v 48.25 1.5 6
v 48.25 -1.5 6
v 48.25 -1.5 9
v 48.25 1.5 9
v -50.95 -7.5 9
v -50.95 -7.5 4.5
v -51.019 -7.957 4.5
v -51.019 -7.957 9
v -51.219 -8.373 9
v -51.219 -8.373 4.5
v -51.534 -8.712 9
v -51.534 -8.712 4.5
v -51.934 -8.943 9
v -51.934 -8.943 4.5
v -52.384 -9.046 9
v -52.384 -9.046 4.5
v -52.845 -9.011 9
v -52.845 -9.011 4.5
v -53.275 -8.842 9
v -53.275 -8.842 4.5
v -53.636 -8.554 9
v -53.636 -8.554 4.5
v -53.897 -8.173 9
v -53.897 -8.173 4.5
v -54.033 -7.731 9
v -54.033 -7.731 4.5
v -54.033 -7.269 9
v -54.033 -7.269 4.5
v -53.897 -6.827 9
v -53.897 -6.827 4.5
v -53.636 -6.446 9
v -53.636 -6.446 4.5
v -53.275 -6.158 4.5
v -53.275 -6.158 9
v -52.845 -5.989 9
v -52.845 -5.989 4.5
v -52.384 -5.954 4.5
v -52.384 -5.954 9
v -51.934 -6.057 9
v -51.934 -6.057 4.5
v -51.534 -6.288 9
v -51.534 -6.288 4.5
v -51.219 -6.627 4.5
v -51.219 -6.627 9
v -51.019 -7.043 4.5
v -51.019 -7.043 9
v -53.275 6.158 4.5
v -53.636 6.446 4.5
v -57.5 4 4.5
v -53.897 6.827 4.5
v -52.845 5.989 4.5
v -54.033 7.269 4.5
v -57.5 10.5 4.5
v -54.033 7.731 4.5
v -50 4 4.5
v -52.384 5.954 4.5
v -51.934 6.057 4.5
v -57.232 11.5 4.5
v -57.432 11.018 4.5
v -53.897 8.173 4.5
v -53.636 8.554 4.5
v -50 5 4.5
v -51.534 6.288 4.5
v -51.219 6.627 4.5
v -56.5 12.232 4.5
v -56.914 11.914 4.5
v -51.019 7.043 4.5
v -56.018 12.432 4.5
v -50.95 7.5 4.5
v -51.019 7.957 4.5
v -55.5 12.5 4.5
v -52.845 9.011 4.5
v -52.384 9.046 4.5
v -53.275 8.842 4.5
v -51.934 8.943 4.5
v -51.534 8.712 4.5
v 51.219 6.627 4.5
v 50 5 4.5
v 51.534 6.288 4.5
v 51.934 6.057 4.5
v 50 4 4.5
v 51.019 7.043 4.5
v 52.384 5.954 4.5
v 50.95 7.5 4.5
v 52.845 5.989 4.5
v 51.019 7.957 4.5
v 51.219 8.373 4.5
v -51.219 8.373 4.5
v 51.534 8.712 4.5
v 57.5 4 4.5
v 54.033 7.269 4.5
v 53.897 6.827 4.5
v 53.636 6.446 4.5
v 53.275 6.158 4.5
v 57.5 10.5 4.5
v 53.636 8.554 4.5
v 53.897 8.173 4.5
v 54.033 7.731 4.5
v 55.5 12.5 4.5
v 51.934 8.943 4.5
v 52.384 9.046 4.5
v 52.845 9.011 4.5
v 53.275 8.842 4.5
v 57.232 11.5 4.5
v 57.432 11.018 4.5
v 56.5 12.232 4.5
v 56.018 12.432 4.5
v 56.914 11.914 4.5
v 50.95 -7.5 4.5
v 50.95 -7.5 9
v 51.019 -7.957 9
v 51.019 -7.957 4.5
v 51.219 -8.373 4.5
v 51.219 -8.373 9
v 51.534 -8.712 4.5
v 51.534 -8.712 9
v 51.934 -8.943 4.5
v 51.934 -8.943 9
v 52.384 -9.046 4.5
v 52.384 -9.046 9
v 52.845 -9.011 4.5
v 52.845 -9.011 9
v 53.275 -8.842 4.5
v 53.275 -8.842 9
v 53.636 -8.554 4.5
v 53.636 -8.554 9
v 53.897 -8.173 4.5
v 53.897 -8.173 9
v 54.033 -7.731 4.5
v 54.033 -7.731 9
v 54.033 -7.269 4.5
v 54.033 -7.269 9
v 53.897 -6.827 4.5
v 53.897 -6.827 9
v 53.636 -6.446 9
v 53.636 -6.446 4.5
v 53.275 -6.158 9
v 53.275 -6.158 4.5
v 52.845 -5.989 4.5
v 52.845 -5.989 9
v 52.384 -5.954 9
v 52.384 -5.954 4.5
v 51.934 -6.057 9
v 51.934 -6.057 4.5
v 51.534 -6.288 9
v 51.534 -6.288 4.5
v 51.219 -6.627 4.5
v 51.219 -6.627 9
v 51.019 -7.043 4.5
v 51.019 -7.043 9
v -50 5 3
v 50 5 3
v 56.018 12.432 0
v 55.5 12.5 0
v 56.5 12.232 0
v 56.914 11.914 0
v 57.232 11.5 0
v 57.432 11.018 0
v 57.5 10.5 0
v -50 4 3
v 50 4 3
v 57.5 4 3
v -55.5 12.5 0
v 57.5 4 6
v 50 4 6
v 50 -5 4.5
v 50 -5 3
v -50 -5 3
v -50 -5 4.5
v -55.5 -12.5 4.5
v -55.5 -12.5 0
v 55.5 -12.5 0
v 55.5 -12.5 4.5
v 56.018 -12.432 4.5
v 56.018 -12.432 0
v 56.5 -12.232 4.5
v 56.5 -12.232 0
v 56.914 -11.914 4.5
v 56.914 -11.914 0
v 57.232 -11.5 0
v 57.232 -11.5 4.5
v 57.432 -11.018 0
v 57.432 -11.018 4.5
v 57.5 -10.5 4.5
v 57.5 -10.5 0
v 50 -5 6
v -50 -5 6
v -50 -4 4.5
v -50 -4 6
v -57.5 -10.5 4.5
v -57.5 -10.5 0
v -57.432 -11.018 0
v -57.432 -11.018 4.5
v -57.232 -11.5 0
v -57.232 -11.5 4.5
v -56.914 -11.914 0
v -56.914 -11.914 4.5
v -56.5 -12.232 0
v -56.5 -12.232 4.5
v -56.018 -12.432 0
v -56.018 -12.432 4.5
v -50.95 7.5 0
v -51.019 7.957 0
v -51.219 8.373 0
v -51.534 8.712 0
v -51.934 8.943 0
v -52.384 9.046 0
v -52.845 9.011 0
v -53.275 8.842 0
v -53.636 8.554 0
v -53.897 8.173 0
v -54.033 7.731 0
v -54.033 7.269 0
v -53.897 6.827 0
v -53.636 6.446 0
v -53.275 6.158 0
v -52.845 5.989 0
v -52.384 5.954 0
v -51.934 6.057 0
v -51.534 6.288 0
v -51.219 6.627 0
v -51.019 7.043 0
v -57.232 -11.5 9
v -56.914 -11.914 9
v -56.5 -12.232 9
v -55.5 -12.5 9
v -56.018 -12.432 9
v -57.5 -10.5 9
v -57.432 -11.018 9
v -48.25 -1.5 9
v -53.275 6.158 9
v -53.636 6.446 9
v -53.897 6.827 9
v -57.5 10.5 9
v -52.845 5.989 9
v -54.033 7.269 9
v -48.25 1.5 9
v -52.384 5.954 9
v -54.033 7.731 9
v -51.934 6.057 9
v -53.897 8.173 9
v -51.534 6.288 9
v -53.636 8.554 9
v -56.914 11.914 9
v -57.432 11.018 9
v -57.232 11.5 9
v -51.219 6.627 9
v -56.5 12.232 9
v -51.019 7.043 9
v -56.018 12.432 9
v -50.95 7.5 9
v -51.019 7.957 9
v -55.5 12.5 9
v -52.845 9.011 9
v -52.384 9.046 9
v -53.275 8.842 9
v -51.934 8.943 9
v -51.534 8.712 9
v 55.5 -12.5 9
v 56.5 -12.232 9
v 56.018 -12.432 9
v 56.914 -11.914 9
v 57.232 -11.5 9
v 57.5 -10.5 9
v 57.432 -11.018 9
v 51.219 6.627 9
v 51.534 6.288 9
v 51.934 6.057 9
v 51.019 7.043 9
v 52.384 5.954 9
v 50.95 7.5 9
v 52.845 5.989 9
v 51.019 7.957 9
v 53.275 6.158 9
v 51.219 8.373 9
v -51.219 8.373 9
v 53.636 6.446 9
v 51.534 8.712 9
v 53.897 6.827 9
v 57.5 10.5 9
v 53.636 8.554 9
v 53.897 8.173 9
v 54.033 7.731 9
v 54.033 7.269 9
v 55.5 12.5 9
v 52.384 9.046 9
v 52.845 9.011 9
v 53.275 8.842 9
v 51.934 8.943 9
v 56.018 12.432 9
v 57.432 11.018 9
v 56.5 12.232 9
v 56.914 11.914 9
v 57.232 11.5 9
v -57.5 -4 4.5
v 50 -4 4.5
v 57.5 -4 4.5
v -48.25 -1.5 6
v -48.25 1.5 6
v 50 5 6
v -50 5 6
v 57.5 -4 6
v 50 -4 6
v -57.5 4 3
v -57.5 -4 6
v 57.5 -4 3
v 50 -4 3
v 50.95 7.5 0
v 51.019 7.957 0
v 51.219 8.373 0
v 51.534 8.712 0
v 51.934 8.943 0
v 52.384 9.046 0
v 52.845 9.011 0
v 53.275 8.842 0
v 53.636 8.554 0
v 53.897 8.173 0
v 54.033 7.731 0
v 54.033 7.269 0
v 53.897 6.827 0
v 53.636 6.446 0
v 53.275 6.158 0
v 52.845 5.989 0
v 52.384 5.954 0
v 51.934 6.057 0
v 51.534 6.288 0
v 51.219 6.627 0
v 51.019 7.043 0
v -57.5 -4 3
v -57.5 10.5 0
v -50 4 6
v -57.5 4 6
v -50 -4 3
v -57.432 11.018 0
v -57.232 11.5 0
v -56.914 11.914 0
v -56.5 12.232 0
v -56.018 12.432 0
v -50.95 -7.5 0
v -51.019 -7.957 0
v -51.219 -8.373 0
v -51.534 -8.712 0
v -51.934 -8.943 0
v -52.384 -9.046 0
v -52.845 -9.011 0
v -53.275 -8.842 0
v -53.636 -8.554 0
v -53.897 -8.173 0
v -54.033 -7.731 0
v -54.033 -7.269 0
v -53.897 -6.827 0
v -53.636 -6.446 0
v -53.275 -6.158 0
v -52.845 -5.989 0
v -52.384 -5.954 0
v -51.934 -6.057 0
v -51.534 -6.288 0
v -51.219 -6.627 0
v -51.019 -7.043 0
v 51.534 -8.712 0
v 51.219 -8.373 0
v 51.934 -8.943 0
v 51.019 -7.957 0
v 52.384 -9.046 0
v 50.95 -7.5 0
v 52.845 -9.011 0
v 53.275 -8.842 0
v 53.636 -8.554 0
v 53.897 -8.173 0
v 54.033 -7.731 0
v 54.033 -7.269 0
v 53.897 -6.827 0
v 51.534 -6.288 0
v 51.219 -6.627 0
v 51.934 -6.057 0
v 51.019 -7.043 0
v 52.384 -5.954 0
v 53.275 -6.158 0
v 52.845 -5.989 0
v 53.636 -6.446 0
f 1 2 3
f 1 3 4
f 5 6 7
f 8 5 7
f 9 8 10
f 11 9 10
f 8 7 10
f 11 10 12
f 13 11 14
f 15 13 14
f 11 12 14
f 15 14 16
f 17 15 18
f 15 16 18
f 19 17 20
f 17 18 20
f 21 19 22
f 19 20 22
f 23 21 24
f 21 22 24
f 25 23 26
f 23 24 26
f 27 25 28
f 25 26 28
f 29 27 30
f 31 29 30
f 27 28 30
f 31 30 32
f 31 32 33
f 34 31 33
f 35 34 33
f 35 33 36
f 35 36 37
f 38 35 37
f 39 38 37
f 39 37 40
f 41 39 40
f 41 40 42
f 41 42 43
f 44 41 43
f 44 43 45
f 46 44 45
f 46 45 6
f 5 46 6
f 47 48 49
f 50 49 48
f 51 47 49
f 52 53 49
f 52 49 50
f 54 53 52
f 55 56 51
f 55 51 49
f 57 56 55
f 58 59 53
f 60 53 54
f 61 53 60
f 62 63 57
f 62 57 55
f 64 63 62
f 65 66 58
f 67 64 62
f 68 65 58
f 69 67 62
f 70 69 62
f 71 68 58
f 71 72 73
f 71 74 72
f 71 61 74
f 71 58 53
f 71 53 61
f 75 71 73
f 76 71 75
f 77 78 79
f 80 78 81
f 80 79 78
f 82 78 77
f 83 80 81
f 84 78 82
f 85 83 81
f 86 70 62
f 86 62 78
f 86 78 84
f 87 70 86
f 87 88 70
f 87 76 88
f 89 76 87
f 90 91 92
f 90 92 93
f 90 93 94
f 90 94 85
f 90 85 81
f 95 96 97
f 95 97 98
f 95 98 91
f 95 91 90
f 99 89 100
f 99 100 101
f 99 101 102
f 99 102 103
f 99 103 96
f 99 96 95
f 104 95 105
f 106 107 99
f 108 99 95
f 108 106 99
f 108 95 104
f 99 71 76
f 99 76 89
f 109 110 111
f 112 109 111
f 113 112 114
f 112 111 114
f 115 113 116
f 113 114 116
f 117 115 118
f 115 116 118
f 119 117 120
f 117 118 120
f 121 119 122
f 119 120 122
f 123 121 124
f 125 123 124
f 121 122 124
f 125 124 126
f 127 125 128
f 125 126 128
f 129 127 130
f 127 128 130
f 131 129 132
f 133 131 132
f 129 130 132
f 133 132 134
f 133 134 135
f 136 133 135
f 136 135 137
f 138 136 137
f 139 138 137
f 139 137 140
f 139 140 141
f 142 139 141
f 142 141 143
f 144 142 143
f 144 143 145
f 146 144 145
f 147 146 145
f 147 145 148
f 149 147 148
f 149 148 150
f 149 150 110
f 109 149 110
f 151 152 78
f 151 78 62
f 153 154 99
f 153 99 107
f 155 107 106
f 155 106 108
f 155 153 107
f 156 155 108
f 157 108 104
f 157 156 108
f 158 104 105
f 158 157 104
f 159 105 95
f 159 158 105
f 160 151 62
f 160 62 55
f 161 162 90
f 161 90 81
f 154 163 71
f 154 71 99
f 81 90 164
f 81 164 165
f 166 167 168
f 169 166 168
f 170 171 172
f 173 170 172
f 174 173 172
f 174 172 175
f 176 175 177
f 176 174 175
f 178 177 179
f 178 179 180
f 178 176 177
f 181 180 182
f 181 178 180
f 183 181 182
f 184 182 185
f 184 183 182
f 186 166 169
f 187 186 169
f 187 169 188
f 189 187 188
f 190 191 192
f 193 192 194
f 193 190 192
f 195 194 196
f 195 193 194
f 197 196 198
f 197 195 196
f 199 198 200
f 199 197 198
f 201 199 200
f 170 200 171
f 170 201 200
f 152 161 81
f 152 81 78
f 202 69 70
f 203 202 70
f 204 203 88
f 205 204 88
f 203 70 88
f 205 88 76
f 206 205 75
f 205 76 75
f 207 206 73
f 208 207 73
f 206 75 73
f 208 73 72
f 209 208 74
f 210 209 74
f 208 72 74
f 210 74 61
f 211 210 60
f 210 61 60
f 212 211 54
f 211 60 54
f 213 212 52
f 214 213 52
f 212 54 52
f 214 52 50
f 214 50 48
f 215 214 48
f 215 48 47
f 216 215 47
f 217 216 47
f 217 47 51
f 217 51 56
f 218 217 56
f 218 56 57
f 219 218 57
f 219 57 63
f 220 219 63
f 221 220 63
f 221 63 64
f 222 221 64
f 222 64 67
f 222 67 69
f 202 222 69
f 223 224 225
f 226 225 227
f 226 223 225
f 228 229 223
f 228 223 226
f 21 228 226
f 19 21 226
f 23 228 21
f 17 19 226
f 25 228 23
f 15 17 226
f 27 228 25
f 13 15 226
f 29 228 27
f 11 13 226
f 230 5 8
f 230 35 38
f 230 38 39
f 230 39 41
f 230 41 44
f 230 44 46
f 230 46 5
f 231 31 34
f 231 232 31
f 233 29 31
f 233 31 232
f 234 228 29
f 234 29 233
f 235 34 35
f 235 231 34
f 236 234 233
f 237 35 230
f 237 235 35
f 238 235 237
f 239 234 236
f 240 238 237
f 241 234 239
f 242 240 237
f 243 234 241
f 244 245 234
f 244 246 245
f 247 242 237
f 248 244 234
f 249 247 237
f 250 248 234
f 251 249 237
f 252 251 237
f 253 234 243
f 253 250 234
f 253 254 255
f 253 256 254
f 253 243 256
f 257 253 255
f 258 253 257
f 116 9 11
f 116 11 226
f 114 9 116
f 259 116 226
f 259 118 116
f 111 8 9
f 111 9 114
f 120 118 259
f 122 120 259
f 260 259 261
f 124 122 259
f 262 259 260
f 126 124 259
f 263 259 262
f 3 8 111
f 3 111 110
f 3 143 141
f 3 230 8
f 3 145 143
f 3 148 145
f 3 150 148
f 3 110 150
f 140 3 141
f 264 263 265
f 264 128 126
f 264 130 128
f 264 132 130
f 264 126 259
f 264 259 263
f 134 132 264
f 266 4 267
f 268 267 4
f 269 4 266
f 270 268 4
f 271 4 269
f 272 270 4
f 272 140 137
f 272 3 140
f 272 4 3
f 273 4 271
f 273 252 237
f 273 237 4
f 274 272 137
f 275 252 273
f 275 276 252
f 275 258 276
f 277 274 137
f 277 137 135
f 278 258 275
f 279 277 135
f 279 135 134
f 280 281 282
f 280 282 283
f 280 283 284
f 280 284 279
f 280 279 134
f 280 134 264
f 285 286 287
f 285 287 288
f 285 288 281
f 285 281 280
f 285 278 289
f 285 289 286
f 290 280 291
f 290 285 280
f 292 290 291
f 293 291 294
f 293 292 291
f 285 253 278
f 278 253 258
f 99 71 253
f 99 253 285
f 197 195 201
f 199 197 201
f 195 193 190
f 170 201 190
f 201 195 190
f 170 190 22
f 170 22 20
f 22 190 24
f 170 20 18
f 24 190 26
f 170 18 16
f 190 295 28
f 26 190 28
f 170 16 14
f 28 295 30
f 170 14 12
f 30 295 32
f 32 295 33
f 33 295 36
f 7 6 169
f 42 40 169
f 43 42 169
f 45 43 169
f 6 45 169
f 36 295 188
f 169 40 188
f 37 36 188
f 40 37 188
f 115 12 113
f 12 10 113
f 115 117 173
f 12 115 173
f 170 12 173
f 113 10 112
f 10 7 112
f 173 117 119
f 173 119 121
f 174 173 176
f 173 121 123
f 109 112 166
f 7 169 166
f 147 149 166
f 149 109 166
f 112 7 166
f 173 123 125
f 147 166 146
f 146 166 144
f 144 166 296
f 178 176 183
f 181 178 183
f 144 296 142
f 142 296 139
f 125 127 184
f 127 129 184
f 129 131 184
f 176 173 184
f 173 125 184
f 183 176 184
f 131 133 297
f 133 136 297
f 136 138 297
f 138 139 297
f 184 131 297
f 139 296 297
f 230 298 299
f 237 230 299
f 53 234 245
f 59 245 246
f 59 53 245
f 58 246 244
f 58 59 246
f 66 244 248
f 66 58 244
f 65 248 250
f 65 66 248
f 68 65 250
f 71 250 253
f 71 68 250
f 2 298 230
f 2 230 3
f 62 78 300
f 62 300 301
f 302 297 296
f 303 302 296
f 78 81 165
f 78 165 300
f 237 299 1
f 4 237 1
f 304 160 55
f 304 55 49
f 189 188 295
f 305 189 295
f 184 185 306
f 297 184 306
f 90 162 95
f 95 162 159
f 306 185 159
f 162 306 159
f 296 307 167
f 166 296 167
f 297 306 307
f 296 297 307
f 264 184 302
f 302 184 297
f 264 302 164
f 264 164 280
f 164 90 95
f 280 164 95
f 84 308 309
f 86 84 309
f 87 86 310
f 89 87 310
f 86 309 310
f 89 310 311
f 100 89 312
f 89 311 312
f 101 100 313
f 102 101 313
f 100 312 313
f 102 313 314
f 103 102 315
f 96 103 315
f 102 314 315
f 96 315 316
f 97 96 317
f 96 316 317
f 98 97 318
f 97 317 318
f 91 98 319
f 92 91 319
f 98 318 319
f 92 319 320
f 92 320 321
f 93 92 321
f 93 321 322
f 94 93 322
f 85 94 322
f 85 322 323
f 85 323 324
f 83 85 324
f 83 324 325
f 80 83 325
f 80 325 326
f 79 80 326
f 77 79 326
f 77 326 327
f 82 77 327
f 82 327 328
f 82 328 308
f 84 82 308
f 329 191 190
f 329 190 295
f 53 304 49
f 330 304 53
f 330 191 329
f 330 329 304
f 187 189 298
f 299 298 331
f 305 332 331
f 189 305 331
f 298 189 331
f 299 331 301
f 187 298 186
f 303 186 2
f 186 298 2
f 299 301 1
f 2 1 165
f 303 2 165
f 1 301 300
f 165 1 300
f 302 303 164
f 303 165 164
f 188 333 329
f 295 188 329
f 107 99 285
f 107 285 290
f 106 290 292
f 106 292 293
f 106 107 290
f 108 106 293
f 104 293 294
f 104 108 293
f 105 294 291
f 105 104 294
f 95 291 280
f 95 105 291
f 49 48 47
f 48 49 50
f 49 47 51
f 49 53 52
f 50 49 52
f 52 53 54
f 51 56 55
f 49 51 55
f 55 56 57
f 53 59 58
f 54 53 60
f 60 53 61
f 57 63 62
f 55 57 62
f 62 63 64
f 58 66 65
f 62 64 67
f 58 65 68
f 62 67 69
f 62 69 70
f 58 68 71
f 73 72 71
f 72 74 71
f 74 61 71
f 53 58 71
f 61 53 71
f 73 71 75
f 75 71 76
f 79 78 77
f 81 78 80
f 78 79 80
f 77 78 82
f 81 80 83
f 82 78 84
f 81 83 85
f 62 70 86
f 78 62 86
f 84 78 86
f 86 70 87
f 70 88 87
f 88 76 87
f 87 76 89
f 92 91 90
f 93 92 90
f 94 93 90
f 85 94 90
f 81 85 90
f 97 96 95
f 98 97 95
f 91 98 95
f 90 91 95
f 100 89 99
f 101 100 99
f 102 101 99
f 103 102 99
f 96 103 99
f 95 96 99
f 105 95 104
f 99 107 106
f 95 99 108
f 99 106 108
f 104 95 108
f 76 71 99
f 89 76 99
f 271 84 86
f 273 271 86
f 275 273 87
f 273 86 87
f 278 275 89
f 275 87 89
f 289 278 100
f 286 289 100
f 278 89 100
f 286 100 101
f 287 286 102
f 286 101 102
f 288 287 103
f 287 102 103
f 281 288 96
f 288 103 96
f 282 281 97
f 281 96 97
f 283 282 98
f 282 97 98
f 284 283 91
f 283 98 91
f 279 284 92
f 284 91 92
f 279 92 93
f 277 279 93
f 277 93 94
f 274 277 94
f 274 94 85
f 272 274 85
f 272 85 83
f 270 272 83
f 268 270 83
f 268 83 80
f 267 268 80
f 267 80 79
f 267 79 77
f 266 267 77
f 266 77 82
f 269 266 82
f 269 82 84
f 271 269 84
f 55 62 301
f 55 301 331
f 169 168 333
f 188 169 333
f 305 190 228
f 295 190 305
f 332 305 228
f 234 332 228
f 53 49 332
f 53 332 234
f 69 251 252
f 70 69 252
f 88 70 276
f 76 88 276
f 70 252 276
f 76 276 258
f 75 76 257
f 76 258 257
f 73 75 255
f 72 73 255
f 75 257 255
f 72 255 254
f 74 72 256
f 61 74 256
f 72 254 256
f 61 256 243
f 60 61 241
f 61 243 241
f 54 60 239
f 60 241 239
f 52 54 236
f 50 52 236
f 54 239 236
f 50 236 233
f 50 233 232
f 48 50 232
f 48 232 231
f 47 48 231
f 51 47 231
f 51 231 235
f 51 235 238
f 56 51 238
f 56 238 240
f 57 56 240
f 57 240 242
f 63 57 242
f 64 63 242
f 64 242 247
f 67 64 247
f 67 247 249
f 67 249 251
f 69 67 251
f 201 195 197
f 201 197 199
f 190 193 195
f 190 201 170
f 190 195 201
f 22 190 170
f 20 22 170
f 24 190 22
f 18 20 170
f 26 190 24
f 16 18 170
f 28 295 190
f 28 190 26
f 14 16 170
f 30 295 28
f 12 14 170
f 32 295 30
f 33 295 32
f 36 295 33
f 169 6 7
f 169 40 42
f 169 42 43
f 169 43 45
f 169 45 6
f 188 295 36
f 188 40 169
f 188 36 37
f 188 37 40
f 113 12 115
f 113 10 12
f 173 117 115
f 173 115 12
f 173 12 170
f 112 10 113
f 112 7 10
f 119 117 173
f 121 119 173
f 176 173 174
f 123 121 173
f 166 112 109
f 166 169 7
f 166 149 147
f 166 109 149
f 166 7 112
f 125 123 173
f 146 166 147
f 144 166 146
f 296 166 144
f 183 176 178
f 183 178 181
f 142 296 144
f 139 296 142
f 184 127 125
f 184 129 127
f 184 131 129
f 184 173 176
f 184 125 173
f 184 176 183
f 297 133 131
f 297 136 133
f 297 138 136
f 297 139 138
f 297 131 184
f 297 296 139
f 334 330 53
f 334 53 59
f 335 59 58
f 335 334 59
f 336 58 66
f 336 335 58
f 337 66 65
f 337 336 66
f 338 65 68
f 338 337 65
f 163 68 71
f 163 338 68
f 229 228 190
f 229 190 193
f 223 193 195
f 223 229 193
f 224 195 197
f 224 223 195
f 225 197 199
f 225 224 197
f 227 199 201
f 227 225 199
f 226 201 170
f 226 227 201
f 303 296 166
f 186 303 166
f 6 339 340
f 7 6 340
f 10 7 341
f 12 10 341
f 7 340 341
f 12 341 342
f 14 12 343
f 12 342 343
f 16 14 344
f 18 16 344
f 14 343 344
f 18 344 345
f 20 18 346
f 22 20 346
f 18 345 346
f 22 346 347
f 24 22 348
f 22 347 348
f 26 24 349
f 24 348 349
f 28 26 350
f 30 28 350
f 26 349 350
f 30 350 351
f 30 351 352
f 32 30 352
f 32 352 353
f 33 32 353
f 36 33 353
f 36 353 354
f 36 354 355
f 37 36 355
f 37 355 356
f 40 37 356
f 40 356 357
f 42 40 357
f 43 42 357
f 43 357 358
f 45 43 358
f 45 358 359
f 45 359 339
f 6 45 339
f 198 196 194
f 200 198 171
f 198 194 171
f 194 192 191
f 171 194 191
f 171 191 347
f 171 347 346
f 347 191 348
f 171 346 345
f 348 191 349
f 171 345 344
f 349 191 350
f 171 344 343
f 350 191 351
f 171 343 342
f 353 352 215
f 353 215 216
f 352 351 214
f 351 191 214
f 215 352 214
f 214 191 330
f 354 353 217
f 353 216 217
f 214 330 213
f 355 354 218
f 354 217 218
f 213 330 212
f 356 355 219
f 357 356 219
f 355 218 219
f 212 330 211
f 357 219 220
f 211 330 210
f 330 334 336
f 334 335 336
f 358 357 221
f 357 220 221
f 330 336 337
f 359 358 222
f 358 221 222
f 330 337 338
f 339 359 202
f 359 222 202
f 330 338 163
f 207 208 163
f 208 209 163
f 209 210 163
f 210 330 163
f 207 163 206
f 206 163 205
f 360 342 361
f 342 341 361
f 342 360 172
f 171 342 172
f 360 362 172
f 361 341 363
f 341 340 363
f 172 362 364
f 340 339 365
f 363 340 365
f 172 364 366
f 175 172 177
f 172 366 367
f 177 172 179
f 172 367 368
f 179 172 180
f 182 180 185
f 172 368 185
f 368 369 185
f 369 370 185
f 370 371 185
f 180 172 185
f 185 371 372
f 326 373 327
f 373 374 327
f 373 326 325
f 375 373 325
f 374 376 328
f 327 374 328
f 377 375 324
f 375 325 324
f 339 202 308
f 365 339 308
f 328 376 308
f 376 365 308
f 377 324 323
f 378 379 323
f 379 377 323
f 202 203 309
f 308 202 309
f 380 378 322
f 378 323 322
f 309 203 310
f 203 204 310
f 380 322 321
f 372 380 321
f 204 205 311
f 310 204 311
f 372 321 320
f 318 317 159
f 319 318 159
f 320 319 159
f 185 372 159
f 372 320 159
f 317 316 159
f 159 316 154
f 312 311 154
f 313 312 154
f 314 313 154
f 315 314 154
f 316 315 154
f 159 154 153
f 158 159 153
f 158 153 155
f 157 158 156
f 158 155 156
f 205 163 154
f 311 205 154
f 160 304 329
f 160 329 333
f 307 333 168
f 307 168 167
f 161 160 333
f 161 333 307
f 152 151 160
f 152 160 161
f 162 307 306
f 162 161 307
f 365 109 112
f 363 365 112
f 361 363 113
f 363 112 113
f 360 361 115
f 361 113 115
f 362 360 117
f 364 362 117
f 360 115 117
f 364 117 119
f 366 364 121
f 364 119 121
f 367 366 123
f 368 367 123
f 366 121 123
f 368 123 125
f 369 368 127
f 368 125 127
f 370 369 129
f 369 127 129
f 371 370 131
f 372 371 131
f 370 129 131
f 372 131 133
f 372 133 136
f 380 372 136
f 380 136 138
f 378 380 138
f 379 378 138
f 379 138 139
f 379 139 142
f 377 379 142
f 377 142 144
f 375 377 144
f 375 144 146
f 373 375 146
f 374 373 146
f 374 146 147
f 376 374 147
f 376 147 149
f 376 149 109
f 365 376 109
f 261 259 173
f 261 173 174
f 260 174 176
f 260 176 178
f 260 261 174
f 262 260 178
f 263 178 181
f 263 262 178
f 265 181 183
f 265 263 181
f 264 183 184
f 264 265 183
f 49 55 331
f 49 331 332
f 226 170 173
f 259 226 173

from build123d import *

# Parameters (mm, degrees)
BOX_BOTTOM_HALF_0_W     = 117
BOX_BOTTOM_HALF_0_H     = 27
BOX_BOTTOM_HALF_0_DEPTH = 5.5
SKETCH_W                = 115
SKETCH_H                = 25
PAD_DEPTH               = 3
PAD001_DEPTH            = 3
SKETCH002_W             = 115
SKETCH002_H             = 25
SKETCH002_W_2           = 96.5
SKETCH002_H_2           = 3
PAD002_DEPTH            = 3
SKETCH003_R             = 1.55
POCKET_DEPTH            = 245.060315
POLARPATTERN_COUNT      = 2
POLARPATTERN001_COUNT   = 2
POLARPATTERN002_COUNT   = 2
FILLET_R                = 2


with BuildPart() as box_bottom_half_0_body:
    # box_bottom_half_0 → box_bottom_half_0 (new body)
    with BuildSketch(Plane(origin=(-58.5, -13.5, -1), x_dir=(1, 0, 0), z_dir=(0, 0, 1))):
        with Locations((58.5, 13.5)):
            Rectangle(BOX_BOTTOM_HALF_0_W, BOX_BOTTOM_HALF_0_H)
    extrude(amount=BOX_BOTTOM_HALF_0_DEPTH)


with BuildPart() as body:
    # Sketch → Pad (new body)
    with BuildSketch(Plane.XY):
        Rectangle(SKETCH_W, SKETCH_H)
    extrude(amount=PAD_DEPTH)

    # Sketch001 (on Face6 of Pad) → Pad001 (join)
    with BuildSketch(Plane.XY.offset(3)):
        Polygon((-57.5, 12.5), (57.5, 12.5), (57.5, 4), (50, 4), (50, 5), (-50, 5), (-50, 4), (-57.5, 4), align=None)
        Polygon((-57.5, -12.5), (57.5, -12.5), (57.5, -4), (50, -4), (50, -5), (-50, -5), (-50, -4), (-57.5, -4), align=None)
    extrude(amount=PAD001_DEPTH)

    # Sketch002 (on Face12 of Pad001) → Pad002 (join)
    with BuildSketch(Plane.XY.offset(6)):
        Rectangle(SKETCH002_W, SKETCH002_H)
        Rectangle(SKETCH002_W_2, SKETCH002_H_2, mode=Mode.SUBTRACT)
    extrude(amount=PAD002_DEPTH)

    # Sketch003 (on Face26 of Pad002) → Pocket (cut, through all)
    with BuildSketch(Plane.XY.offset(9)):
        with Locations((-52.5, 7.5)):
            Circle(SKETCH003_R)
    pocket = extrude(amount=-POCKET_DEPTH, mode=Mode.SUBTRACT)

    # PolarPattern: Pocket ×2 about axis
    polarpattern_axis = Axis((0, 0, 0), (0, 1, 0))
    for i in range(1, POLARPATTERN_COUNT):
        add(pocket.rotate(polarpattern_axis, i * 360 / POLARPATTERN_COUNT), mode=Mode.SUBTRACT)

    # PolarPattern001: Pocket ×2 about axis
    polarpattern001_axis = Axis((0, 0, 0), (1, 0, 0))
    for i in range(1, POLARPATTERN001_COUNT):
        add(pocket.rotate(polarpattern001_axis, i * 360 / POLARPATTERN001_COUNT), mode=Mode.SUBTRACT)

    # PolarPattern002: Pocket ×2 about axis
    polarpattern002_axis = Axis((0, 0, 9), (0, 0, 1))
    for i in range(1, POLARPATTERN002_COUNT):
        add(pocket.rotate(polarpattern002_axis, i * 360 / POLARPATTERN002_COUNT), mode=Mode.SUBTRACT)

    # Fillet
    fillet_edges = [body.edges().sort_by_distance(p)[0] for p in [
        (57.5, 12.5, 7.5),
        (57.5, 12.5, 4.5),
        (57.5, 12.5, 1.5),
        (57.5, -12.5, 7.5),
        (-57.5, 12.5, 7.5),
        (-57.5, -12.5, 7.5),
    ]]
    fillet(fillet_edges, radius=FILLET_R)


with BuildPart() as bottom_half_0_body:
    # bottom_half_0 base: copy of Body
    add(body.part)

    # bottom_half_0: intersect box_bottom_half_0 body
    add(box_bottom_half_0_body.part, mode=Mode.INTERSECT)


with BuildPart() as top_half_0_body:
    # top_half_0 base: copy of Body
    add(body.part)

    # top_half_0: cut box_bottom_half_0 body
    add(box_bottom_half_0_body.part, mode=Mode.SUBTRACT)


solid = Compound([bottom_half_0_body.part, top_half_0_body.part])
